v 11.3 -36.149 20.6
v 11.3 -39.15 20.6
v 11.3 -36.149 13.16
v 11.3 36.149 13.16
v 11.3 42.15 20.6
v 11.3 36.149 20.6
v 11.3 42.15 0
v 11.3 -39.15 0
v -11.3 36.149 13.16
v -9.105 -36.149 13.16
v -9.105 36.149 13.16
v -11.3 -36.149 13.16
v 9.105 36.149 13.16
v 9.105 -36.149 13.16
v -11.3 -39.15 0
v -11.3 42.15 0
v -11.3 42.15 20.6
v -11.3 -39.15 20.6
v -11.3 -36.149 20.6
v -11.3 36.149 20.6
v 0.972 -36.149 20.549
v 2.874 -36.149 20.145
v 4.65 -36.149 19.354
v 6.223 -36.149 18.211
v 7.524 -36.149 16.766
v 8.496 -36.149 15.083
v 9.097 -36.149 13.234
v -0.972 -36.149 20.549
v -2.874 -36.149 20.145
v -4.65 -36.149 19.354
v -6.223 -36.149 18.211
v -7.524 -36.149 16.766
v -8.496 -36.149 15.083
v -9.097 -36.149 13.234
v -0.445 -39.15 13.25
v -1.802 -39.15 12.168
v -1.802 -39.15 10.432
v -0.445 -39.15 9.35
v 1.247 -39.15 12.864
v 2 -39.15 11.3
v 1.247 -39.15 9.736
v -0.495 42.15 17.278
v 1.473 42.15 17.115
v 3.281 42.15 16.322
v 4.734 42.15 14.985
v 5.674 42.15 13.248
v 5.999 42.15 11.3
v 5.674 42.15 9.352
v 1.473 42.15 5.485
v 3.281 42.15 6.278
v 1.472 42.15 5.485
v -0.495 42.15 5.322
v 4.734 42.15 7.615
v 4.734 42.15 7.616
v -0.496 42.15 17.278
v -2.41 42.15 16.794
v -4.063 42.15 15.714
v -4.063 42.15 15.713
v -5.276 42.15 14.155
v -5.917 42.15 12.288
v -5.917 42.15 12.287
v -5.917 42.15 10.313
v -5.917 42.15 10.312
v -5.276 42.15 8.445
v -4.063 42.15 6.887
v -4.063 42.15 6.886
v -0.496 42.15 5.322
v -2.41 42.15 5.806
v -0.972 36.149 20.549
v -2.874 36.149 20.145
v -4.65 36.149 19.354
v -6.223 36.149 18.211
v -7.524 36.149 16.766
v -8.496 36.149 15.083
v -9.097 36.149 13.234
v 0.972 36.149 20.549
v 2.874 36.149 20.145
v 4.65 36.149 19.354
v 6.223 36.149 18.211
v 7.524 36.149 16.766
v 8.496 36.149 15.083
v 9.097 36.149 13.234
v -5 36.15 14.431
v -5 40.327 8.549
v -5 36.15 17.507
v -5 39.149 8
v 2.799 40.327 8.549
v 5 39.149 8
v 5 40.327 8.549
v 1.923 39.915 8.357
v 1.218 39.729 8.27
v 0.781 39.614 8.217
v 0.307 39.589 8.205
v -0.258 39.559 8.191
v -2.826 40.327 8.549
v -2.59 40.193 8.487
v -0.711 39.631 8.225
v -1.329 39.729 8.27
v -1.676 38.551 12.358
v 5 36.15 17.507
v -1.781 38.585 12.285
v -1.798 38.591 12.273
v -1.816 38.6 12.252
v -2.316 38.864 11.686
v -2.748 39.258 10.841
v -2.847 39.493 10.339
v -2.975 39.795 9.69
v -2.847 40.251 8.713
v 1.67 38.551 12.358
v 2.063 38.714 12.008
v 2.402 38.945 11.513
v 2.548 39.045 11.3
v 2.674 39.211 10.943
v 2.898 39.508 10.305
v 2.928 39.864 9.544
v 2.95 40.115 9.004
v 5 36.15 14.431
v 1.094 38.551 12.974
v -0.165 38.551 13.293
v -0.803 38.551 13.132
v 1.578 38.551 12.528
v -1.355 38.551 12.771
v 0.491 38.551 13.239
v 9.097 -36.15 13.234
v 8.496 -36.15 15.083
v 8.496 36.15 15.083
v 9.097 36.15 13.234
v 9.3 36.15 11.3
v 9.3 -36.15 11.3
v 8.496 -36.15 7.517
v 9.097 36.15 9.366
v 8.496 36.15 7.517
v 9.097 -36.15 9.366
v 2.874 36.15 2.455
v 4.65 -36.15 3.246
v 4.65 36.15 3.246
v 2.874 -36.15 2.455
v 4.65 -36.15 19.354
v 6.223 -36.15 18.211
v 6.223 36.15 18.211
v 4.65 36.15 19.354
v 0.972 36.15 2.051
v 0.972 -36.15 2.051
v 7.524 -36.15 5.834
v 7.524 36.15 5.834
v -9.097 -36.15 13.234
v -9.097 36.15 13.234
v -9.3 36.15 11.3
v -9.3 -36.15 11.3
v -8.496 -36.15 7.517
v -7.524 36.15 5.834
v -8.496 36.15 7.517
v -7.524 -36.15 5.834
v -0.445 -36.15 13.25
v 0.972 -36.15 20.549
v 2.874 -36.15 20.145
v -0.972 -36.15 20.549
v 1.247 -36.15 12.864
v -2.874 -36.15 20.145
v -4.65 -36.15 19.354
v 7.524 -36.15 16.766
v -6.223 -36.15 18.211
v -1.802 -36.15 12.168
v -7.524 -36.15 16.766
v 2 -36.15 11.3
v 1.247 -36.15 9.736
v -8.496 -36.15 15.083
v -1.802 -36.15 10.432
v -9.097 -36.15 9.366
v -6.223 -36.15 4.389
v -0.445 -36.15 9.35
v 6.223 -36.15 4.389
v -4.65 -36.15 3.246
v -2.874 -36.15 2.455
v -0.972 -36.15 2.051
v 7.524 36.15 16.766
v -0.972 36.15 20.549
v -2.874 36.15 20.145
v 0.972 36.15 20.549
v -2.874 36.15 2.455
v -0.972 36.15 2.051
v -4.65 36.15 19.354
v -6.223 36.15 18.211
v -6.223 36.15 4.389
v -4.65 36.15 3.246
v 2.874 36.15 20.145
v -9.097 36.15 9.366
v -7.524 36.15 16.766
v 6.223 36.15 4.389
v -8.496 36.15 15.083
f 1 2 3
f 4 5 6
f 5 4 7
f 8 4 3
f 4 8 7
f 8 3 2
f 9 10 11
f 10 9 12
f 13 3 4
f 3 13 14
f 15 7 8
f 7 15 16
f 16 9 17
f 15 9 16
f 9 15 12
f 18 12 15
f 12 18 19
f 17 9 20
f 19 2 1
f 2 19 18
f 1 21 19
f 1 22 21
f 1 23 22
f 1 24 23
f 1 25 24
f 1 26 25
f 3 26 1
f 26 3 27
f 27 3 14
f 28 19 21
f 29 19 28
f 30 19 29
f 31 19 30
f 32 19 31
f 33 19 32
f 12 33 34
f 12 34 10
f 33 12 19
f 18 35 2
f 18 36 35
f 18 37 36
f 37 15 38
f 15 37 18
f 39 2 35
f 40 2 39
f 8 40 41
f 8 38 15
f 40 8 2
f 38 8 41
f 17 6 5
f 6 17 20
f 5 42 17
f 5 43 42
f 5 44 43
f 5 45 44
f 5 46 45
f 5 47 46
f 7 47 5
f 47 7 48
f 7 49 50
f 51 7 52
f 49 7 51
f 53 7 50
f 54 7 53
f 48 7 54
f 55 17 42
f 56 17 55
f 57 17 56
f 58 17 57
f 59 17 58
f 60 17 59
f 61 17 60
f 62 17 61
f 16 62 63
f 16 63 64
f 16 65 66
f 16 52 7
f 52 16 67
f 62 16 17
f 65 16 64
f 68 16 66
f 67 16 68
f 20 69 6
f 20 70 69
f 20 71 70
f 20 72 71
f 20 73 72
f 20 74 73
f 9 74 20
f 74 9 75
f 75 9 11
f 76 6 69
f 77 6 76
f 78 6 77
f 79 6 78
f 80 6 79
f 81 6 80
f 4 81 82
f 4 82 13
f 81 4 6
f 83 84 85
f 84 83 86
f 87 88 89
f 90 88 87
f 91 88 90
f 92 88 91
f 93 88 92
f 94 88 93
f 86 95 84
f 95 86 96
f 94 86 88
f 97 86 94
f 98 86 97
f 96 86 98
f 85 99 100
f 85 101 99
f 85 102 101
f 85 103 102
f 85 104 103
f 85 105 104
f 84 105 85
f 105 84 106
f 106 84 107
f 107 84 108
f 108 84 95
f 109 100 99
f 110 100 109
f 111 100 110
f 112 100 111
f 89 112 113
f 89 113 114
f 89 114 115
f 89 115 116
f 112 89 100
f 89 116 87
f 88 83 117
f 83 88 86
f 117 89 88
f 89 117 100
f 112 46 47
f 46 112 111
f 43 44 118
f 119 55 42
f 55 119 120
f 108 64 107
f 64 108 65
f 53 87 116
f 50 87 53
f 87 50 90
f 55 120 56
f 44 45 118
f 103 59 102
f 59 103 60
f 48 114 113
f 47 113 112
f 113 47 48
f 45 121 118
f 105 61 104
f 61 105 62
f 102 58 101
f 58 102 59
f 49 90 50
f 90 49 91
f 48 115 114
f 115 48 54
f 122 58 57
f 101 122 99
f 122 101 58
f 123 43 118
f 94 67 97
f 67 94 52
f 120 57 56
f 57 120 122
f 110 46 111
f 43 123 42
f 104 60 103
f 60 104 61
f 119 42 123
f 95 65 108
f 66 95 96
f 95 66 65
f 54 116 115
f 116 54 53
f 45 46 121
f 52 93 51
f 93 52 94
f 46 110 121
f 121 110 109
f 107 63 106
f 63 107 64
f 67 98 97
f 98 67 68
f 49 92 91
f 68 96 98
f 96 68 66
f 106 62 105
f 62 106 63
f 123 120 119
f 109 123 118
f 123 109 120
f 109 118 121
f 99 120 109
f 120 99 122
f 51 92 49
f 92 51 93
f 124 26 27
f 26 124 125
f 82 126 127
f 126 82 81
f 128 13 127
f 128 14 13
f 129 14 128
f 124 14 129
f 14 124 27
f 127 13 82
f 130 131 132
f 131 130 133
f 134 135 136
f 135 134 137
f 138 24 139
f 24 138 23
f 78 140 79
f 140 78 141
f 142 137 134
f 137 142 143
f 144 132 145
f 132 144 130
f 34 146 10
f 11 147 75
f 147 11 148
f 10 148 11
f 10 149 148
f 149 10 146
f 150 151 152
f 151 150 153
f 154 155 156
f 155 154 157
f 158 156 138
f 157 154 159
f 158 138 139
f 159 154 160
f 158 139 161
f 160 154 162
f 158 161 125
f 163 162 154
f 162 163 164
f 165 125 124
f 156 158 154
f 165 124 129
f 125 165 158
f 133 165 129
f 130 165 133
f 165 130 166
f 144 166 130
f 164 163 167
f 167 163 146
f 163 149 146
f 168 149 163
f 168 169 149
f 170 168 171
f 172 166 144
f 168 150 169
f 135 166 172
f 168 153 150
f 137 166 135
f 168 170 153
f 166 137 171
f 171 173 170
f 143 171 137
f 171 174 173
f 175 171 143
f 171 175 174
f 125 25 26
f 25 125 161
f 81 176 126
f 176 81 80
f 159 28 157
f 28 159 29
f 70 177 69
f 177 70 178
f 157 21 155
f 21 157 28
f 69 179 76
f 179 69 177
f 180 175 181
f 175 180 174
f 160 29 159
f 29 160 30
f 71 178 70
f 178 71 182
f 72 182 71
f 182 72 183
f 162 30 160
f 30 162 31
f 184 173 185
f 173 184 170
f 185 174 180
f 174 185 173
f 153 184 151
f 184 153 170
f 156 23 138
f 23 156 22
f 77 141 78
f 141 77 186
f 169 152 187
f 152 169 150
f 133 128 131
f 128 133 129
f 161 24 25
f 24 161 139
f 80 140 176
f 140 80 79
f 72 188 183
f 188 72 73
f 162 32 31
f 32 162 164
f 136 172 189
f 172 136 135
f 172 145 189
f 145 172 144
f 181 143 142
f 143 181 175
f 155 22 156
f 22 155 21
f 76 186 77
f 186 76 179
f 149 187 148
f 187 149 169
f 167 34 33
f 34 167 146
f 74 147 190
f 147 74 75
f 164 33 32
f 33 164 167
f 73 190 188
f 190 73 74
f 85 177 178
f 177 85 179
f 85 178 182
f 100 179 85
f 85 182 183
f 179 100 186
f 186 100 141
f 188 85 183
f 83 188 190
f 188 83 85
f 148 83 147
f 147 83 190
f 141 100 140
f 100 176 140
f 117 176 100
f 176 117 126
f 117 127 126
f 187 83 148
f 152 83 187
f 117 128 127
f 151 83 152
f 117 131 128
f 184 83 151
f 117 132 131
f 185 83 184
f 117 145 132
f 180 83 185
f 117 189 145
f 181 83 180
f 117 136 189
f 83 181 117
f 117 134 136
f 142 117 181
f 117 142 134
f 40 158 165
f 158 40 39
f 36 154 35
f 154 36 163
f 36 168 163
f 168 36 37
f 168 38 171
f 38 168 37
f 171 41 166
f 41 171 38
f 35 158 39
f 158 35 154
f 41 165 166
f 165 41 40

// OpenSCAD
extrasize = 0.3;
extraInEnd = 2;
// 70 are batteruy lenght lenght is battery holes lenght
lenght = 70 + extrasize + extraInEnd;
// battery dia
dia = 18.3 + extrasize;
// minimiwallThickness 
wallT = 2;
// lenght of the piese at end of battery minus end
minusEndL = 3;
// same whit +
plusEndL = 6;
epsilon = 0.001;
// hole for wire
wireholeR = 2;
// plus end metalpice
metalPieseT = 1 + extrasize;
metalPieceWidth = 10;
caseLenght = lenght + minusEndL + plusEndL;

difference(){
	union(){
			// case
			translate([-dia/2-wallT,-lenght/2,0]) 
					cube([dia+2*wallT,  lenght ,3/5*dia + wallT]);

			//minusend of case
			translate([-dia/2-wallT,-lenght/2 -minusEndL,0]) 
					cube([dia+2*wallT,  minusEndL+epsilon ,dia + wallT]);

			// plusend
			translate([-dia/2-wallT,+lenght/2 -epsilon,0])	
			 	cube([dia+2*wallT,  plusEndL+epsilon ,dia + wallT]);

	}
	// place for metalpiece
	translate([-metalPieceWidth/2,+lenght/2 -epsilon +plusEndL/2,8])rotate([25,0,0])
 		cube([metalPieceWidth,  metalPieseT ,dia + wallT]);

	// pluswire
	translate([0,lenght/2 + plusEndL+epsilon, dia/2+wallT]) rotate([90]) 			cylinder(3*plusEndL/5, r2= wireholeR, r1 = 3*wireholeR);

	// battery
	translate([0,lenght/2, dia/2+wallT]) rotate([90]) 
		cylinder(lenght, r= dia/2);

	// minuswireHole
	translate([0,lenght/2, dia/2+wallT]) rotate([90]) 
		cylinder(3/2*lenght, r= wireholeR);
}
